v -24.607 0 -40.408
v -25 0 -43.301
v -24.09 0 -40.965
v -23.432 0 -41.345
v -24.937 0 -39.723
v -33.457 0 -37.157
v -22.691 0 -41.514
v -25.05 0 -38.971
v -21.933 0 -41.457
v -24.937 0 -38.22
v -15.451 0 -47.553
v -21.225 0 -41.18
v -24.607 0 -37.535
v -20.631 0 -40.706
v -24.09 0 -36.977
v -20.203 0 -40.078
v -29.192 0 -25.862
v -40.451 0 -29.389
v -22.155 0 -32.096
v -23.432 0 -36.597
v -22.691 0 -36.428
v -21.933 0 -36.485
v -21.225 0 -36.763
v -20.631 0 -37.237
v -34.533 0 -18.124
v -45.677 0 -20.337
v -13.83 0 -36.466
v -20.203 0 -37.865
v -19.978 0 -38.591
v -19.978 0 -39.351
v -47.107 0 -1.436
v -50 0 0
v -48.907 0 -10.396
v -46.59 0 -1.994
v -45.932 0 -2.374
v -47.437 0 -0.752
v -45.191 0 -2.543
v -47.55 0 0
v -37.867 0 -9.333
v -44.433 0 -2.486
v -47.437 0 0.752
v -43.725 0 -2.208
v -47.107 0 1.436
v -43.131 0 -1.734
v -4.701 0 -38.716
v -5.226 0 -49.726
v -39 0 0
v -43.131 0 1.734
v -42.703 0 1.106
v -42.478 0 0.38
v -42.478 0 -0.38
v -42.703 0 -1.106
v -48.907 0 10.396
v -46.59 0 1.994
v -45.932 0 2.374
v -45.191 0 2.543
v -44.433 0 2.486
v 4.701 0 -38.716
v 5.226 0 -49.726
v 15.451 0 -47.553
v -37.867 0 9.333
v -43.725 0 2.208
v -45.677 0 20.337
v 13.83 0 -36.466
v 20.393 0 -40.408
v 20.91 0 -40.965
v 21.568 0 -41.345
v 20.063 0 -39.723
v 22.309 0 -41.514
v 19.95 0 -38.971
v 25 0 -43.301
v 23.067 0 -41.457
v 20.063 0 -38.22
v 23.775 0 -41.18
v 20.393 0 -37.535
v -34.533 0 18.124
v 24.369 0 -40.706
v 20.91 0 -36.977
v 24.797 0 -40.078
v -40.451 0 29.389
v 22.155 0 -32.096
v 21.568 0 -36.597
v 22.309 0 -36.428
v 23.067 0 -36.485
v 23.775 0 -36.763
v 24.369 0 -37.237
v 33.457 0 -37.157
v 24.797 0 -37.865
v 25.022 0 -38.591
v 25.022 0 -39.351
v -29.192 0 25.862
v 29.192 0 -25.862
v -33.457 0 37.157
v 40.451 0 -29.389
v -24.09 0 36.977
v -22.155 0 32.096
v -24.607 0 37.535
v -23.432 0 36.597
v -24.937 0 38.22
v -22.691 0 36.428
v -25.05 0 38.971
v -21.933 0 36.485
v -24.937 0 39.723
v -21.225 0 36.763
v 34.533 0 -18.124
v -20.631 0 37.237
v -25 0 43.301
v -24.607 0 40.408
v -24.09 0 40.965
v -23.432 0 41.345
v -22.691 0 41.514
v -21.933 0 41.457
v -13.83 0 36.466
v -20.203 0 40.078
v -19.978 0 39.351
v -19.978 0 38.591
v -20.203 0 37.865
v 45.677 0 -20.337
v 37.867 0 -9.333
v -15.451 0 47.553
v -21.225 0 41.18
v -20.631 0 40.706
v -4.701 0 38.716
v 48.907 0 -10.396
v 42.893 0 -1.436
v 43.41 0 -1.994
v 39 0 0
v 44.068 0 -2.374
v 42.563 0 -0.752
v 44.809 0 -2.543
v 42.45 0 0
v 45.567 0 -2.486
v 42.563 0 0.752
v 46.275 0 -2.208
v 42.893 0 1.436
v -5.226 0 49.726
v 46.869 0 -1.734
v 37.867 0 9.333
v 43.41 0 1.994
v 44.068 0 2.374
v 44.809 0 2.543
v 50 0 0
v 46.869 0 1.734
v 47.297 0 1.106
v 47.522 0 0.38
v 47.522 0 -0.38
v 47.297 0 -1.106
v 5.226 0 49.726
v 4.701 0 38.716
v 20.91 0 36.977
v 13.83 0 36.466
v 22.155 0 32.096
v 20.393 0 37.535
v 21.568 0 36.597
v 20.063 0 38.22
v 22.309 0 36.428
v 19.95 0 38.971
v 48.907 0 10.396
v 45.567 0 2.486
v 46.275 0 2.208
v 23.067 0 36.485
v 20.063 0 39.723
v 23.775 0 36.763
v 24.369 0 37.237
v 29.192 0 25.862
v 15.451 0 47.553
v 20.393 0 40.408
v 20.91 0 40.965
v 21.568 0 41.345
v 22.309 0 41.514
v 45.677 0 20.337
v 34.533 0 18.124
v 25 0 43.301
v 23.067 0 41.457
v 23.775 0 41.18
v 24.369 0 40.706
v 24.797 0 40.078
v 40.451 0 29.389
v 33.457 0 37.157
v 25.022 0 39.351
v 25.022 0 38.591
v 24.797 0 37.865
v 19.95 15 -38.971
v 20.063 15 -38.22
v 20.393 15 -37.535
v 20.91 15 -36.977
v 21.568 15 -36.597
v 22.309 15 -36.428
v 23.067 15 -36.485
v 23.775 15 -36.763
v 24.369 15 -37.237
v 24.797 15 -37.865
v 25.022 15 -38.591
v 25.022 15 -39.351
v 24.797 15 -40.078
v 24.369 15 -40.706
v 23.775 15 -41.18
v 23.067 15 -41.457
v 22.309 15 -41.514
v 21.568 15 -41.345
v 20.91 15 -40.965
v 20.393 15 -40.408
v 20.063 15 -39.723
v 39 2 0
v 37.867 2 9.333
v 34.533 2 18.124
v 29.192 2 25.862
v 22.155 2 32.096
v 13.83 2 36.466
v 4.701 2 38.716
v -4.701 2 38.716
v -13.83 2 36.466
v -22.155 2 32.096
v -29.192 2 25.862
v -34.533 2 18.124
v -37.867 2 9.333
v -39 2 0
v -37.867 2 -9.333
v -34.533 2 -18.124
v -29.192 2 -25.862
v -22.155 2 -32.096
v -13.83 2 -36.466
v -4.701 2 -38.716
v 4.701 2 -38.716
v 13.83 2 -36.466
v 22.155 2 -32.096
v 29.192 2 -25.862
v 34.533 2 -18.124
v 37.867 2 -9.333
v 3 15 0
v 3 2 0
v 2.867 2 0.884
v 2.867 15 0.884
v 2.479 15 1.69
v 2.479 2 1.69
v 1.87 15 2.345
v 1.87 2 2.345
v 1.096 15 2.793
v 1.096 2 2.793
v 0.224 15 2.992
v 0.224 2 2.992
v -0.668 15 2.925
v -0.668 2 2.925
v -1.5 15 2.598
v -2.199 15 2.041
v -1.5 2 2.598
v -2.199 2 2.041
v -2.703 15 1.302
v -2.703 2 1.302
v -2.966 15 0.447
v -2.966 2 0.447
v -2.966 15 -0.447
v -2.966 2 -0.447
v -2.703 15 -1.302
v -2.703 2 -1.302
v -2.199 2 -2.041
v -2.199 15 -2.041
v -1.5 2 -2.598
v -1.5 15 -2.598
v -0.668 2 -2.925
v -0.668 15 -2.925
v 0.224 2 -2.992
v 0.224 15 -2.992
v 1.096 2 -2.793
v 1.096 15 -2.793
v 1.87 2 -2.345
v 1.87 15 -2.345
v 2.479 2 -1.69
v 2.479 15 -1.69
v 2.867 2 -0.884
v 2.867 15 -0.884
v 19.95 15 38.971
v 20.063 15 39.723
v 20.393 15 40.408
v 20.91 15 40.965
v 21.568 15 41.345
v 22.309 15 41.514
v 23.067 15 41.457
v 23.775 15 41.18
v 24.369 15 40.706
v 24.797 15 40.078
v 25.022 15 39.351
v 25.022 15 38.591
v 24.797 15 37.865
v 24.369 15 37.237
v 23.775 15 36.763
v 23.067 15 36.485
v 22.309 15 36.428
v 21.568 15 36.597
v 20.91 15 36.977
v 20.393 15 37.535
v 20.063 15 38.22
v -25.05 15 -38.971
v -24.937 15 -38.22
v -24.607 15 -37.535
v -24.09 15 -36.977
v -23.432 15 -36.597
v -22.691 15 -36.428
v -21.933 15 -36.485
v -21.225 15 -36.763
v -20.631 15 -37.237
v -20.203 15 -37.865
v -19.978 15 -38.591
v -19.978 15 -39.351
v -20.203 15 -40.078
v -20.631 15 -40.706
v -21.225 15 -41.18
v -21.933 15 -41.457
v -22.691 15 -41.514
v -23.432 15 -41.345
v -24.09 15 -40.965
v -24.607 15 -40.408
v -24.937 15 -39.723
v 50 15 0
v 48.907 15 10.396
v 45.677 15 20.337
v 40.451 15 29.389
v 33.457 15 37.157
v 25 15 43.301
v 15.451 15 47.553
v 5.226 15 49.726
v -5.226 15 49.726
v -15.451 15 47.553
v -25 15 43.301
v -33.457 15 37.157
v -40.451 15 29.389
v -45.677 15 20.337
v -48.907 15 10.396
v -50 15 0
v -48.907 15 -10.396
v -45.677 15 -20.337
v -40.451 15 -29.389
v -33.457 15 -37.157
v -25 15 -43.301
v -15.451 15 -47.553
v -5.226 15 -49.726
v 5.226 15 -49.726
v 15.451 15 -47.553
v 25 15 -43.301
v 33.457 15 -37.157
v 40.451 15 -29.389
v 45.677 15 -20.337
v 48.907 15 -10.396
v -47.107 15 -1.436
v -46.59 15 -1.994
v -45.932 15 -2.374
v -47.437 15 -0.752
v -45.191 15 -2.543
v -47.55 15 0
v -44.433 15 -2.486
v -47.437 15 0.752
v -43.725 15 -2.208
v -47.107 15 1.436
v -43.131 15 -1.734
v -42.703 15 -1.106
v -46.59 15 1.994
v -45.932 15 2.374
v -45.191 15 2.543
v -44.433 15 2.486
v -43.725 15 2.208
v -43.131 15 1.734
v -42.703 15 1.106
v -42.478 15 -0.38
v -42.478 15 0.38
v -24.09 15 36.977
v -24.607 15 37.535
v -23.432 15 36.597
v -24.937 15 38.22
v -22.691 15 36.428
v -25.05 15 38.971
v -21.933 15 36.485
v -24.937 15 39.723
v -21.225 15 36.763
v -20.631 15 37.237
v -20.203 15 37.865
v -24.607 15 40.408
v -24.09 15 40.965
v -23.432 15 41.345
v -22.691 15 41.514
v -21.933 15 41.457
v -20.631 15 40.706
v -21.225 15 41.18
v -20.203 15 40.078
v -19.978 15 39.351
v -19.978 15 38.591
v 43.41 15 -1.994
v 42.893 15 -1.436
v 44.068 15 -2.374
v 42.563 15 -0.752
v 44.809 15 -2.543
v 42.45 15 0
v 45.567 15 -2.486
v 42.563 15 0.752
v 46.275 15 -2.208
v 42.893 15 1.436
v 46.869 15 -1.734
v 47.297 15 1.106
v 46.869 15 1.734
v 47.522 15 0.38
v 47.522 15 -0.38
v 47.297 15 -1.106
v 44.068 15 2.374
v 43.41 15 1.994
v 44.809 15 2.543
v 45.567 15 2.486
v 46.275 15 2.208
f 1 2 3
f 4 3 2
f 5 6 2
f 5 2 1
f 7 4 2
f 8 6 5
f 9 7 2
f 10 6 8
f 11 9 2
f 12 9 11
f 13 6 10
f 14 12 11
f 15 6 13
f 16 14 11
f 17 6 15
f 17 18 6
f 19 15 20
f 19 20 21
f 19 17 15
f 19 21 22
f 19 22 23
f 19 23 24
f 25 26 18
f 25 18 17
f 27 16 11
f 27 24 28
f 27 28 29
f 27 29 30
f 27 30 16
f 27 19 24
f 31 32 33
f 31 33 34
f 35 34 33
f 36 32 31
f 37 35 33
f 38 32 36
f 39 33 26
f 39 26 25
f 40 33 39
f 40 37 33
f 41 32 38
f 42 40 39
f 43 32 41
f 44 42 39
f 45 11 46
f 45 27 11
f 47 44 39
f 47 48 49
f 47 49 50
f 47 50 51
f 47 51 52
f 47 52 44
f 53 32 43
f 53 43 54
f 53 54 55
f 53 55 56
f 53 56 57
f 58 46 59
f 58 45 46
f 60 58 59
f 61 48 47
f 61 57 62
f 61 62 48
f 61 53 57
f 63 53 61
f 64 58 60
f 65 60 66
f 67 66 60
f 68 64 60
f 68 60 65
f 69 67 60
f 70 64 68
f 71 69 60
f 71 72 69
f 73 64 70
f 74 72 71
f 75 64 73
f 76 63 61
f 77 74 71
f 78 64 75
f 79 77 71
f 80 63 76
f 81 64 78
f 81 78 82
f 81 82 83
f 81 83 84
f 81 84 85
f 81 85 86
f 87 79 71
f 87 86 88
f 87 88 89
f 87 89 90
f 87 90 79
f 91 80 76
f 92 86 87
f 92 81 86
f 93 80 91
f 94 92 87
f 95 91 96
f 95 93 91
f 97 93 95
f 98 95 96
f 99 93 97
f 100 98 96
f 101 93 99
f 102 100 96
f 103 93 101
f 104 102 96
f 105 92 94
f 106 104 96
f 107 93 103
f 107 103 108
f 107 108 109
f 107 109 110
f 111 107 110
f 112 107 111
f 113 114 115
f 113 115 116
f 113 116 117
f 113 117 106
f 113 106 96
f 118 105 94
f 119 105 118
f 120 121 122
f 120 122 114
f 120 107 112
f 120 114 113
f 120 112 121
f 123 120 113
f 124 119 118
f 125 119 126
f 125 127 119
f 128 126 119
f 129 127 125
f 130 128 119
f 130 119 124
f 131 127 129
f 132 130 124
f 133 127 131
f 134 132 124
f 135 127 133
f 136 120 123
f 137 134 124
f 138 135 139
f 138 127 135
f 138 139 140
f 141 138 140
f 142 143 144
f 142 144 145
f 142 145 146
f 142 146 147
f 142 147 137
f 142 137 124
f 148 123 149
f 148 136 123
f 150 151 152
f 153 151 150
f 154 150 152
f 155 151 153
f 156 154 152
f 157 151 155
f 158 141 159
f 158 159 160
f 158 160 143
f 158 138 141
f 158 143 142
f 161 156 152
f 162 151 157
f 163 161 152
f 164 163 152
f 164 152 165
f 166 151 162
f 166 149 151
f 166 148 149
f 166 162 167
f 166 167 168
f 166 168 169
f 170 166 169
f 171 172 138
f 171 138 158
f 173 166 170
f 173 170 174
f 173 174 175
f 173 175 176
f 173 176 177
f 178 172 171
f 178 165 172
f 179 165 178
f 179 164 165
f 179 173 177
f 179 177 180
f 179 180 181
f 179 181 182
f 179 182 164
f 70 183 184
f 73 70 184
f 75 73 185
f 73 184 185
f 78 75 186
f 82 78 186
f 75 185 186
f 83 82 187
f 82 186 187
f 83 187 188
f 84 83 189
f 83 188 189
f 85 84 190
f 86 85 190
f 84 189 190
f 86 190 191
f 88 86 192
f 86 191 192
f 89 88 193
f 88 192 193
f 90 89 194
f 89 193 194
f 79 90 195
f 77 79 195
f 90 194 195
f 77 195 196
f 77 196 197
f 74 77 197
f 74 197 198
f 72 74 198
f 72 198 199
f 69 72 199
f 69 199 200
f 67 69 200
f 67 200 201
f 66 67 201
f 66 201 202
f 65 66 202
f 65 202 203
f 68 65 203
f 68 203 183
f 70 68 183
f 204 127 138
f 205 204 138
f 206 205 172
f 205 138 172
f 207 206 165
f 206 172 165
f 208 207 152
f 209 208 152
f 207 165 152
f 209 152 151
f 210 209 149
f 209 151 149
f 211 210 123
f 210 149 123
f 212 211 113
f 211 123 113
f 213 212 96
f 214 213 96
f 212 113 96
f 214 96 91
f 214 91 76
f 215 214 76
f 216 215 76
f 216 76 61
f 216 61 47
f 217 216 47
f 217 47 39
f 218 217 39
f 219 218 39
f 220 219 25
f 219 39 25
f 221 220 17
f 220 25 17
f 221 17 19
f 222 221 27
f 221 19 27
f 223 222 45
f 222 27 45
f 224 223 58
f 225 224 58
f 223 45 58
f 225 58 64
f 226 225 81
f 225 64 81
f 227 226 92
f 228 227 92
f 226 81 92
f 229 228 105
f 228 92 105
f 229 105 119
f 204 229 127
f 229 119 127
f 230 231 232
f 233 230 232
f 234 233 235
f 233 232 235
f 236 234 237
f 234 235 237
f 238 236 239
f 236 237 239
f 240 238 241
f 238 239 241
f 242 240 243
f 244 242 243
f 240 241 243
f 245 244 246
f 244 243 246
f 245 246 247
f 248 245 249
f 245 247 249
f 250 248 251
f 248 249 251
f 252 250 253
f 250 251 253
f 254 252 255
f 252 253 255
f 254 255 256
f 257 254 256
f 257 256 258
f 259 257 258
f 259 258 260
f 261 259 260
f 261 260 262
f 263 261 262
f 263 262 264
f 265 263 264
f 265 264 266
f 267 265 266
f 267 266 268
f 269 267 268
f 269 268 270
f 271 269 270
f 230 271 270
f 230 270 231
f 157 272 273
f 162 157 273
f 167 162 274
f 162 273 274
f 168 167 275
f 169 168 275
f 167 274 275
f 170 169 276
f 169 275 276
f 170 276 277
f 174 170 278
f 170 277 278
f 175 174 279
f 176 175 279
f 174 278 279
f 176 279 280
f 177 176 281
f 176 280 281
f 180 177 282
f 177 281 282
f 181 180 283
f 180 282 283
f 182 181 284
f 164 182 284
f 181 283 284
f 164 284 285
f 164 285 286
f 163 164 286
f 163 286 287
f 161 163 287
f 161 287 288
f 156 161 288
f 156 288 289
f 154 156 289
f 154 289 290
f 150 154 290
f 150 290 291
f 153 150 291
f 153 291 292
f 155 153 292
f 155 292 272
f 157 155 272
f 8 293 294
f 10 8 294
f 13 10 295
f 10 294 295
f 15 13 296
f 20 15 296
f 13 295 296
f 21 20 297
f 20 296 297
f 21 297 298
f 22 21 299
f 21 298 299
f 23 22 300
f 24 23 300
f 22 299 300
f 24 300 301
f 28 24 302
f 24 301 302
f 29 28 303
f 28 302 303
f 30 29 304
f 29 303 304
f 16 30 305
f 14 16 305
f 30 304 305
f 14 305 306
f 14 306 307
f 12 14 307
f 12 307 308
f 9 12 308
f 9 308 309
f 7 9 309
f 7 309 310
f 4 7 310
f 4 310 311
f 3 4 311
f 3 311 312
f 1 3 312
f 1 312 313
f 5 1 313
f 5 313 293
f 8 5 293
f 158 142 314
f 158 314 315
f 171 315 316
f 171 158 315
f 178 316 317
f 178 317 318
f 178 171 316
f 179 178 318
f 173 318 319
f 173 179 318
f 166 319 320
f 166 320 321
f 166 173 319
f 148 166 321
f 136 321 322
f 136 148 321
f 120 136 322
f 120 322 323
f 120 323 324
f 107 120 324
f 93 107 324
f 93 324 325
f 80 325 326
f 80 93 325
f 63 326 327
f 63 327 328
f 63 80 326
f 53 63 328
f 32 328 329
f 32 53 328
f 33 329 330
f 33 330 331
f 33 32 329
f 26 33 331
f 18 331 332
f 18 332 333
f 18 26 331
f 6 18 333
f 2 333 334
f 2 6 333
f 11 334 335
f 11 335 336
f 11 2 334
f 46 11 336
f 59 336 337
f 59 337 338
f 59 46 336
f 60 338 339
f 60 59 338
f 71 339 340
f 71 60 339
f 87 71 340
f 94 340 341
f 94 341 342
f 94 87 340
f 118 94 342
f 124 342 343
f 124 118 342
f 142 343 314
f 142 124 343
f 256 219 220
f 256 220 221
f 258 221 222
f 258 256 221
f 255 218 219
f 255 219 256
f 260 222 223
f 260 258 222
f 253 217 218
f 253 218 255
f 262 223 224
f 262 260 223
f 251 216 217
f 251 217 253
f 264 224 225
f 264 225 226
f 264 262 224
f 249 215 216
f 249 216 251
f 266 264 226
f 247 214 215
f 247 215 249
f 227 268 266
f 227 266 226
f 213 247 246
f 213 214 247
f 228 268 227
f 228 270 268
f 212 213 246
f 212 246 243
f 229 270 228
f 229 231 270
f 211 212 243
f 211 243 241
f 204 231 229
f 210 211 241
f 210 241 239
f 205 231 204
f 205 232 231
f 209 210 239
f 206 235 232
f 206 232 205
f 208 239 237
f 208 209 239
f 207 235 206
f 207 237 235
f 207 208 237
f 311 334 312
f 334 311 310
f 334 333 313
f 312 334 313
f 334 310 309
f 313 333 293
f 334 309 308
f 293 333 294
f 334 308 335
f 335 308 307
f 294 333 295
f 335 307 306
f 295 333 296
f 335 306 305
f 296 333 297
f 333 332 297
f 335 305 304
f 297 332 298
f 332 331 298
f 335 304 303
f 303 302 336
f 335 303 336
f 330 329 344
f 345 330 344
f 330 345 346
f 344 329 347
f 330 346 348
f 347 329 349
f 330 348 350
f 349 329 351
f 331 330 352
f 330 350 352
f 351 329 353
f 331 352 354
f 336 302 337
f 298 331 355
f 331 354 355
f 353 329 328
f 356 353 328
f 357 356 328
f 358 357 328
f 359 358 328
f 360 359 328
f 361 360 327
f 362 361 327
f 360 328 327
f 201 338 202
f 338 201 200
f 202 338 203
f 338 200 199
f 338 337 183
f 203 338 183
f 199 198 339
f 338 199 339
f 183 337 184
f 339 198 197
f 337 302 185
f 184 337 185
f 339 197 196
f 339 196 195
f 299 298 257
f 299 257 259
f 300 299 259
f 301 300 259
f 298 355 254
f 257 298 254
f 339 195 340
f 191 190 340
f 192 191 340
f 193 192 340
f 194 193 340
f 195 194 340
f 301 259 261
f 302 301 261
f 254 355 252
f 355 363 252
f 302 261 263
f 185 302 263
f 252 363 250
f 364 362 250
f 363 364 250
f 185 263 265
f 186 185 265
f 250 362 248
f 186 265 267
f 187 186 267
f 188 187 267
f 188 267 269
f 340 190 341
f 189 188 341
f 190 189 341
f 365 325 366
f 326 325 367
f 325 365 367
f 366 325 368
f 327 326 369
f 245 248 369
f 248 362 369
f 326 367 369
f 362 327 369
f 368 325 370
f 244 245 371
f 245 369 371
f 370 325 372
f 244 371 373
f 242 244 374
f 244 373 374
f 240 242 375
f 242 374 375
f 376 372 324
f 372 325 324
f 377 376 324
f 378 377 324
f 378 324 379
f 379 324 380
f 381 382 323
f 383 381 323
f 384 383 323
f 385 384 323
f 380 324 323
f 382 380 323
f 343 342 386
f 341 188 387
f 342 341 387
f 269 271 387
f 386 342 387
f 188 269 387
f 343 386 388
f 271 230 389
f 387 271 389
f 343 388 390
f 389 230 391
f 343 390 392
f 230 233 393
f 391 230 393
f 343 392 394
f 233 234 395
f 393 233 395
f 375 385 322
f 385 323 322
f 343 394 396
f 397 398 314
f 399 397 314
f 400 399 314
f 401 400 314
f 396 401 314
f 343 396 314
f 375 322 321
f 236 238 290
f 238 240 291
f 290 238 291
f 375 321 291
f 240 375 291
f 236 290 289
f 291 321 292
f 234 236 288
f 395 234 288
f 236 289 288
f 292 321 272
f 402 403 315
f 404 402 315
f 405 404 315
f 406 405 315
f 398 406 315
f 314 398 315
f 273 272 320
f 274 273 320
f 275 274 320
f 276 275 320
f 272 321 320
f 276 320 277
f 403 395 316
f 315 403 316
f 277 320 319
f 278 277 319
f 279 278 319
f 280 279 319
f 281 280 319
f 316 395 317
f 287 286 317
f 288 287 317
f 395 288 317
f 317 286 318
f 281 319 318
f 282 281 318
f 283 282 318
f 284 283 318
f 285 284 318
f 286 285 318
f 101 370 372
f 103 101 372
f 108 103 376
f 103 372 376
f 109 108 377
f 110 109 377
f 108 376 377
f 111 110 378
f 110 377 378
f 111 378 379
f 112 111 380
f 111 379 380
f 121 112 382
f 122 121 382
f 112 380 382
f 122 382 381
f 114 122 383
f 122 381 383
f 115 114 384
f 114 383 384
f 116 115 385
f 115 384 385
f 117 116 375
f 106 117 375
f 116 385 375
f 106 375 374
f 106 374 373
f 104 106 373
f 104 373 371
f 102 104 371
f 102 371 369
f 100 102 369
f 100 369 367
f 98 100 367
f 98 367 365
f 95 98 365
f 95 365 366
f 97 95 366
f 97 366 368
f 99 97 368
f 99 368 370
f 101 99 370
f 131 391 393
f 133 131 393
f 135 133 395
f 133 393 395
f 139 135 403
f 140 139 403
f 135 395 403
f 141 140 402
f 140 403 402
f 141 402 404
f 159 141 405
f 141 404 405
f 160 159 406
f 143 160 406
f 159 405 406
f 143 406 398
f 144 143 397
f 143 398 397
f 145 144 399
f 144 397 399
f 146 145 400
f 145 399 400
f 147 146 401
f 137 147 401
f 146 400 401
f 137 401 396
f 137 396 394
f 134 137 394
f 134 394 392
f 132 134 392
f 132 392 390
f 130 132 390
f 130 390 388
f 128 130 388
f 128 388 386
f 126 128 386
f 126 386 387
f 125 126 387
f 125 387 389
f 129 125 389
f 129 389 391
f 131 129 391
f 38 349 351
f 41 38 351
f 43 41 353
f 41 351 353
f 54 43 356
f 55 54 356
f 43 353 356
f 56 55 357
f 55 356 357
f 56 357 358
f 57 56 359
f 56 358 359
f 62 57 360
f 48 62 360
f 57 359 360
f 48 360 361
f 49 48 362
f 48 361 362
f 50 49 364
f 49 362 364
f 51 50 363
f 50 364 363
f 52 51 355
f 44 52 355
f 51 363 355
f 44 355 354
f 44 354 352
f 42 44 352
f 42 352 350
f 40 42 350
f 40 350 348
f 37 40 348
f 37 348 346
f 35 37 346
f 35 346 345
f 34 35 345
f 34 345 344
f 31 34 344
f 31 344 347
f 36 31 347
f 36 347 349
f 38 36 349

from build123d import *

# Parameters (mm, degrees)
F0_R     = 50
F0_R_2   = 3
F1_DEPTH = 15
F3_D     = 5.1
F4_R     = 39
F5_DEPTH = 2


with BuildPart() as f1:
    # F0 (on Front) → F1 (new body)
    with BuildSketch(Plane.XZ):
        Circle(F0_R)
        Circle(F0_R_2, mode=Mode.SUBTRACT)
    extrude(amount=-F1_DEPTH)

    # F3 (through all)
    with Locations(Plane.XZ):
        with Locations((-22.5, 38.971143), (22.5, 38.971143), (45, 0), (22.5, -38.971143), (-22.5, -38.971143), (-45, 0)):
            Hole(F3_D / 2)

    # F4 (on Front) → F5 (cut)
    with BuildSketch(Plane.XZ):
        Circle(F4_R)
    extrude(amount=-F5_DEPTH, mode=Mode.SUBTRACT)


solid = f1.part
